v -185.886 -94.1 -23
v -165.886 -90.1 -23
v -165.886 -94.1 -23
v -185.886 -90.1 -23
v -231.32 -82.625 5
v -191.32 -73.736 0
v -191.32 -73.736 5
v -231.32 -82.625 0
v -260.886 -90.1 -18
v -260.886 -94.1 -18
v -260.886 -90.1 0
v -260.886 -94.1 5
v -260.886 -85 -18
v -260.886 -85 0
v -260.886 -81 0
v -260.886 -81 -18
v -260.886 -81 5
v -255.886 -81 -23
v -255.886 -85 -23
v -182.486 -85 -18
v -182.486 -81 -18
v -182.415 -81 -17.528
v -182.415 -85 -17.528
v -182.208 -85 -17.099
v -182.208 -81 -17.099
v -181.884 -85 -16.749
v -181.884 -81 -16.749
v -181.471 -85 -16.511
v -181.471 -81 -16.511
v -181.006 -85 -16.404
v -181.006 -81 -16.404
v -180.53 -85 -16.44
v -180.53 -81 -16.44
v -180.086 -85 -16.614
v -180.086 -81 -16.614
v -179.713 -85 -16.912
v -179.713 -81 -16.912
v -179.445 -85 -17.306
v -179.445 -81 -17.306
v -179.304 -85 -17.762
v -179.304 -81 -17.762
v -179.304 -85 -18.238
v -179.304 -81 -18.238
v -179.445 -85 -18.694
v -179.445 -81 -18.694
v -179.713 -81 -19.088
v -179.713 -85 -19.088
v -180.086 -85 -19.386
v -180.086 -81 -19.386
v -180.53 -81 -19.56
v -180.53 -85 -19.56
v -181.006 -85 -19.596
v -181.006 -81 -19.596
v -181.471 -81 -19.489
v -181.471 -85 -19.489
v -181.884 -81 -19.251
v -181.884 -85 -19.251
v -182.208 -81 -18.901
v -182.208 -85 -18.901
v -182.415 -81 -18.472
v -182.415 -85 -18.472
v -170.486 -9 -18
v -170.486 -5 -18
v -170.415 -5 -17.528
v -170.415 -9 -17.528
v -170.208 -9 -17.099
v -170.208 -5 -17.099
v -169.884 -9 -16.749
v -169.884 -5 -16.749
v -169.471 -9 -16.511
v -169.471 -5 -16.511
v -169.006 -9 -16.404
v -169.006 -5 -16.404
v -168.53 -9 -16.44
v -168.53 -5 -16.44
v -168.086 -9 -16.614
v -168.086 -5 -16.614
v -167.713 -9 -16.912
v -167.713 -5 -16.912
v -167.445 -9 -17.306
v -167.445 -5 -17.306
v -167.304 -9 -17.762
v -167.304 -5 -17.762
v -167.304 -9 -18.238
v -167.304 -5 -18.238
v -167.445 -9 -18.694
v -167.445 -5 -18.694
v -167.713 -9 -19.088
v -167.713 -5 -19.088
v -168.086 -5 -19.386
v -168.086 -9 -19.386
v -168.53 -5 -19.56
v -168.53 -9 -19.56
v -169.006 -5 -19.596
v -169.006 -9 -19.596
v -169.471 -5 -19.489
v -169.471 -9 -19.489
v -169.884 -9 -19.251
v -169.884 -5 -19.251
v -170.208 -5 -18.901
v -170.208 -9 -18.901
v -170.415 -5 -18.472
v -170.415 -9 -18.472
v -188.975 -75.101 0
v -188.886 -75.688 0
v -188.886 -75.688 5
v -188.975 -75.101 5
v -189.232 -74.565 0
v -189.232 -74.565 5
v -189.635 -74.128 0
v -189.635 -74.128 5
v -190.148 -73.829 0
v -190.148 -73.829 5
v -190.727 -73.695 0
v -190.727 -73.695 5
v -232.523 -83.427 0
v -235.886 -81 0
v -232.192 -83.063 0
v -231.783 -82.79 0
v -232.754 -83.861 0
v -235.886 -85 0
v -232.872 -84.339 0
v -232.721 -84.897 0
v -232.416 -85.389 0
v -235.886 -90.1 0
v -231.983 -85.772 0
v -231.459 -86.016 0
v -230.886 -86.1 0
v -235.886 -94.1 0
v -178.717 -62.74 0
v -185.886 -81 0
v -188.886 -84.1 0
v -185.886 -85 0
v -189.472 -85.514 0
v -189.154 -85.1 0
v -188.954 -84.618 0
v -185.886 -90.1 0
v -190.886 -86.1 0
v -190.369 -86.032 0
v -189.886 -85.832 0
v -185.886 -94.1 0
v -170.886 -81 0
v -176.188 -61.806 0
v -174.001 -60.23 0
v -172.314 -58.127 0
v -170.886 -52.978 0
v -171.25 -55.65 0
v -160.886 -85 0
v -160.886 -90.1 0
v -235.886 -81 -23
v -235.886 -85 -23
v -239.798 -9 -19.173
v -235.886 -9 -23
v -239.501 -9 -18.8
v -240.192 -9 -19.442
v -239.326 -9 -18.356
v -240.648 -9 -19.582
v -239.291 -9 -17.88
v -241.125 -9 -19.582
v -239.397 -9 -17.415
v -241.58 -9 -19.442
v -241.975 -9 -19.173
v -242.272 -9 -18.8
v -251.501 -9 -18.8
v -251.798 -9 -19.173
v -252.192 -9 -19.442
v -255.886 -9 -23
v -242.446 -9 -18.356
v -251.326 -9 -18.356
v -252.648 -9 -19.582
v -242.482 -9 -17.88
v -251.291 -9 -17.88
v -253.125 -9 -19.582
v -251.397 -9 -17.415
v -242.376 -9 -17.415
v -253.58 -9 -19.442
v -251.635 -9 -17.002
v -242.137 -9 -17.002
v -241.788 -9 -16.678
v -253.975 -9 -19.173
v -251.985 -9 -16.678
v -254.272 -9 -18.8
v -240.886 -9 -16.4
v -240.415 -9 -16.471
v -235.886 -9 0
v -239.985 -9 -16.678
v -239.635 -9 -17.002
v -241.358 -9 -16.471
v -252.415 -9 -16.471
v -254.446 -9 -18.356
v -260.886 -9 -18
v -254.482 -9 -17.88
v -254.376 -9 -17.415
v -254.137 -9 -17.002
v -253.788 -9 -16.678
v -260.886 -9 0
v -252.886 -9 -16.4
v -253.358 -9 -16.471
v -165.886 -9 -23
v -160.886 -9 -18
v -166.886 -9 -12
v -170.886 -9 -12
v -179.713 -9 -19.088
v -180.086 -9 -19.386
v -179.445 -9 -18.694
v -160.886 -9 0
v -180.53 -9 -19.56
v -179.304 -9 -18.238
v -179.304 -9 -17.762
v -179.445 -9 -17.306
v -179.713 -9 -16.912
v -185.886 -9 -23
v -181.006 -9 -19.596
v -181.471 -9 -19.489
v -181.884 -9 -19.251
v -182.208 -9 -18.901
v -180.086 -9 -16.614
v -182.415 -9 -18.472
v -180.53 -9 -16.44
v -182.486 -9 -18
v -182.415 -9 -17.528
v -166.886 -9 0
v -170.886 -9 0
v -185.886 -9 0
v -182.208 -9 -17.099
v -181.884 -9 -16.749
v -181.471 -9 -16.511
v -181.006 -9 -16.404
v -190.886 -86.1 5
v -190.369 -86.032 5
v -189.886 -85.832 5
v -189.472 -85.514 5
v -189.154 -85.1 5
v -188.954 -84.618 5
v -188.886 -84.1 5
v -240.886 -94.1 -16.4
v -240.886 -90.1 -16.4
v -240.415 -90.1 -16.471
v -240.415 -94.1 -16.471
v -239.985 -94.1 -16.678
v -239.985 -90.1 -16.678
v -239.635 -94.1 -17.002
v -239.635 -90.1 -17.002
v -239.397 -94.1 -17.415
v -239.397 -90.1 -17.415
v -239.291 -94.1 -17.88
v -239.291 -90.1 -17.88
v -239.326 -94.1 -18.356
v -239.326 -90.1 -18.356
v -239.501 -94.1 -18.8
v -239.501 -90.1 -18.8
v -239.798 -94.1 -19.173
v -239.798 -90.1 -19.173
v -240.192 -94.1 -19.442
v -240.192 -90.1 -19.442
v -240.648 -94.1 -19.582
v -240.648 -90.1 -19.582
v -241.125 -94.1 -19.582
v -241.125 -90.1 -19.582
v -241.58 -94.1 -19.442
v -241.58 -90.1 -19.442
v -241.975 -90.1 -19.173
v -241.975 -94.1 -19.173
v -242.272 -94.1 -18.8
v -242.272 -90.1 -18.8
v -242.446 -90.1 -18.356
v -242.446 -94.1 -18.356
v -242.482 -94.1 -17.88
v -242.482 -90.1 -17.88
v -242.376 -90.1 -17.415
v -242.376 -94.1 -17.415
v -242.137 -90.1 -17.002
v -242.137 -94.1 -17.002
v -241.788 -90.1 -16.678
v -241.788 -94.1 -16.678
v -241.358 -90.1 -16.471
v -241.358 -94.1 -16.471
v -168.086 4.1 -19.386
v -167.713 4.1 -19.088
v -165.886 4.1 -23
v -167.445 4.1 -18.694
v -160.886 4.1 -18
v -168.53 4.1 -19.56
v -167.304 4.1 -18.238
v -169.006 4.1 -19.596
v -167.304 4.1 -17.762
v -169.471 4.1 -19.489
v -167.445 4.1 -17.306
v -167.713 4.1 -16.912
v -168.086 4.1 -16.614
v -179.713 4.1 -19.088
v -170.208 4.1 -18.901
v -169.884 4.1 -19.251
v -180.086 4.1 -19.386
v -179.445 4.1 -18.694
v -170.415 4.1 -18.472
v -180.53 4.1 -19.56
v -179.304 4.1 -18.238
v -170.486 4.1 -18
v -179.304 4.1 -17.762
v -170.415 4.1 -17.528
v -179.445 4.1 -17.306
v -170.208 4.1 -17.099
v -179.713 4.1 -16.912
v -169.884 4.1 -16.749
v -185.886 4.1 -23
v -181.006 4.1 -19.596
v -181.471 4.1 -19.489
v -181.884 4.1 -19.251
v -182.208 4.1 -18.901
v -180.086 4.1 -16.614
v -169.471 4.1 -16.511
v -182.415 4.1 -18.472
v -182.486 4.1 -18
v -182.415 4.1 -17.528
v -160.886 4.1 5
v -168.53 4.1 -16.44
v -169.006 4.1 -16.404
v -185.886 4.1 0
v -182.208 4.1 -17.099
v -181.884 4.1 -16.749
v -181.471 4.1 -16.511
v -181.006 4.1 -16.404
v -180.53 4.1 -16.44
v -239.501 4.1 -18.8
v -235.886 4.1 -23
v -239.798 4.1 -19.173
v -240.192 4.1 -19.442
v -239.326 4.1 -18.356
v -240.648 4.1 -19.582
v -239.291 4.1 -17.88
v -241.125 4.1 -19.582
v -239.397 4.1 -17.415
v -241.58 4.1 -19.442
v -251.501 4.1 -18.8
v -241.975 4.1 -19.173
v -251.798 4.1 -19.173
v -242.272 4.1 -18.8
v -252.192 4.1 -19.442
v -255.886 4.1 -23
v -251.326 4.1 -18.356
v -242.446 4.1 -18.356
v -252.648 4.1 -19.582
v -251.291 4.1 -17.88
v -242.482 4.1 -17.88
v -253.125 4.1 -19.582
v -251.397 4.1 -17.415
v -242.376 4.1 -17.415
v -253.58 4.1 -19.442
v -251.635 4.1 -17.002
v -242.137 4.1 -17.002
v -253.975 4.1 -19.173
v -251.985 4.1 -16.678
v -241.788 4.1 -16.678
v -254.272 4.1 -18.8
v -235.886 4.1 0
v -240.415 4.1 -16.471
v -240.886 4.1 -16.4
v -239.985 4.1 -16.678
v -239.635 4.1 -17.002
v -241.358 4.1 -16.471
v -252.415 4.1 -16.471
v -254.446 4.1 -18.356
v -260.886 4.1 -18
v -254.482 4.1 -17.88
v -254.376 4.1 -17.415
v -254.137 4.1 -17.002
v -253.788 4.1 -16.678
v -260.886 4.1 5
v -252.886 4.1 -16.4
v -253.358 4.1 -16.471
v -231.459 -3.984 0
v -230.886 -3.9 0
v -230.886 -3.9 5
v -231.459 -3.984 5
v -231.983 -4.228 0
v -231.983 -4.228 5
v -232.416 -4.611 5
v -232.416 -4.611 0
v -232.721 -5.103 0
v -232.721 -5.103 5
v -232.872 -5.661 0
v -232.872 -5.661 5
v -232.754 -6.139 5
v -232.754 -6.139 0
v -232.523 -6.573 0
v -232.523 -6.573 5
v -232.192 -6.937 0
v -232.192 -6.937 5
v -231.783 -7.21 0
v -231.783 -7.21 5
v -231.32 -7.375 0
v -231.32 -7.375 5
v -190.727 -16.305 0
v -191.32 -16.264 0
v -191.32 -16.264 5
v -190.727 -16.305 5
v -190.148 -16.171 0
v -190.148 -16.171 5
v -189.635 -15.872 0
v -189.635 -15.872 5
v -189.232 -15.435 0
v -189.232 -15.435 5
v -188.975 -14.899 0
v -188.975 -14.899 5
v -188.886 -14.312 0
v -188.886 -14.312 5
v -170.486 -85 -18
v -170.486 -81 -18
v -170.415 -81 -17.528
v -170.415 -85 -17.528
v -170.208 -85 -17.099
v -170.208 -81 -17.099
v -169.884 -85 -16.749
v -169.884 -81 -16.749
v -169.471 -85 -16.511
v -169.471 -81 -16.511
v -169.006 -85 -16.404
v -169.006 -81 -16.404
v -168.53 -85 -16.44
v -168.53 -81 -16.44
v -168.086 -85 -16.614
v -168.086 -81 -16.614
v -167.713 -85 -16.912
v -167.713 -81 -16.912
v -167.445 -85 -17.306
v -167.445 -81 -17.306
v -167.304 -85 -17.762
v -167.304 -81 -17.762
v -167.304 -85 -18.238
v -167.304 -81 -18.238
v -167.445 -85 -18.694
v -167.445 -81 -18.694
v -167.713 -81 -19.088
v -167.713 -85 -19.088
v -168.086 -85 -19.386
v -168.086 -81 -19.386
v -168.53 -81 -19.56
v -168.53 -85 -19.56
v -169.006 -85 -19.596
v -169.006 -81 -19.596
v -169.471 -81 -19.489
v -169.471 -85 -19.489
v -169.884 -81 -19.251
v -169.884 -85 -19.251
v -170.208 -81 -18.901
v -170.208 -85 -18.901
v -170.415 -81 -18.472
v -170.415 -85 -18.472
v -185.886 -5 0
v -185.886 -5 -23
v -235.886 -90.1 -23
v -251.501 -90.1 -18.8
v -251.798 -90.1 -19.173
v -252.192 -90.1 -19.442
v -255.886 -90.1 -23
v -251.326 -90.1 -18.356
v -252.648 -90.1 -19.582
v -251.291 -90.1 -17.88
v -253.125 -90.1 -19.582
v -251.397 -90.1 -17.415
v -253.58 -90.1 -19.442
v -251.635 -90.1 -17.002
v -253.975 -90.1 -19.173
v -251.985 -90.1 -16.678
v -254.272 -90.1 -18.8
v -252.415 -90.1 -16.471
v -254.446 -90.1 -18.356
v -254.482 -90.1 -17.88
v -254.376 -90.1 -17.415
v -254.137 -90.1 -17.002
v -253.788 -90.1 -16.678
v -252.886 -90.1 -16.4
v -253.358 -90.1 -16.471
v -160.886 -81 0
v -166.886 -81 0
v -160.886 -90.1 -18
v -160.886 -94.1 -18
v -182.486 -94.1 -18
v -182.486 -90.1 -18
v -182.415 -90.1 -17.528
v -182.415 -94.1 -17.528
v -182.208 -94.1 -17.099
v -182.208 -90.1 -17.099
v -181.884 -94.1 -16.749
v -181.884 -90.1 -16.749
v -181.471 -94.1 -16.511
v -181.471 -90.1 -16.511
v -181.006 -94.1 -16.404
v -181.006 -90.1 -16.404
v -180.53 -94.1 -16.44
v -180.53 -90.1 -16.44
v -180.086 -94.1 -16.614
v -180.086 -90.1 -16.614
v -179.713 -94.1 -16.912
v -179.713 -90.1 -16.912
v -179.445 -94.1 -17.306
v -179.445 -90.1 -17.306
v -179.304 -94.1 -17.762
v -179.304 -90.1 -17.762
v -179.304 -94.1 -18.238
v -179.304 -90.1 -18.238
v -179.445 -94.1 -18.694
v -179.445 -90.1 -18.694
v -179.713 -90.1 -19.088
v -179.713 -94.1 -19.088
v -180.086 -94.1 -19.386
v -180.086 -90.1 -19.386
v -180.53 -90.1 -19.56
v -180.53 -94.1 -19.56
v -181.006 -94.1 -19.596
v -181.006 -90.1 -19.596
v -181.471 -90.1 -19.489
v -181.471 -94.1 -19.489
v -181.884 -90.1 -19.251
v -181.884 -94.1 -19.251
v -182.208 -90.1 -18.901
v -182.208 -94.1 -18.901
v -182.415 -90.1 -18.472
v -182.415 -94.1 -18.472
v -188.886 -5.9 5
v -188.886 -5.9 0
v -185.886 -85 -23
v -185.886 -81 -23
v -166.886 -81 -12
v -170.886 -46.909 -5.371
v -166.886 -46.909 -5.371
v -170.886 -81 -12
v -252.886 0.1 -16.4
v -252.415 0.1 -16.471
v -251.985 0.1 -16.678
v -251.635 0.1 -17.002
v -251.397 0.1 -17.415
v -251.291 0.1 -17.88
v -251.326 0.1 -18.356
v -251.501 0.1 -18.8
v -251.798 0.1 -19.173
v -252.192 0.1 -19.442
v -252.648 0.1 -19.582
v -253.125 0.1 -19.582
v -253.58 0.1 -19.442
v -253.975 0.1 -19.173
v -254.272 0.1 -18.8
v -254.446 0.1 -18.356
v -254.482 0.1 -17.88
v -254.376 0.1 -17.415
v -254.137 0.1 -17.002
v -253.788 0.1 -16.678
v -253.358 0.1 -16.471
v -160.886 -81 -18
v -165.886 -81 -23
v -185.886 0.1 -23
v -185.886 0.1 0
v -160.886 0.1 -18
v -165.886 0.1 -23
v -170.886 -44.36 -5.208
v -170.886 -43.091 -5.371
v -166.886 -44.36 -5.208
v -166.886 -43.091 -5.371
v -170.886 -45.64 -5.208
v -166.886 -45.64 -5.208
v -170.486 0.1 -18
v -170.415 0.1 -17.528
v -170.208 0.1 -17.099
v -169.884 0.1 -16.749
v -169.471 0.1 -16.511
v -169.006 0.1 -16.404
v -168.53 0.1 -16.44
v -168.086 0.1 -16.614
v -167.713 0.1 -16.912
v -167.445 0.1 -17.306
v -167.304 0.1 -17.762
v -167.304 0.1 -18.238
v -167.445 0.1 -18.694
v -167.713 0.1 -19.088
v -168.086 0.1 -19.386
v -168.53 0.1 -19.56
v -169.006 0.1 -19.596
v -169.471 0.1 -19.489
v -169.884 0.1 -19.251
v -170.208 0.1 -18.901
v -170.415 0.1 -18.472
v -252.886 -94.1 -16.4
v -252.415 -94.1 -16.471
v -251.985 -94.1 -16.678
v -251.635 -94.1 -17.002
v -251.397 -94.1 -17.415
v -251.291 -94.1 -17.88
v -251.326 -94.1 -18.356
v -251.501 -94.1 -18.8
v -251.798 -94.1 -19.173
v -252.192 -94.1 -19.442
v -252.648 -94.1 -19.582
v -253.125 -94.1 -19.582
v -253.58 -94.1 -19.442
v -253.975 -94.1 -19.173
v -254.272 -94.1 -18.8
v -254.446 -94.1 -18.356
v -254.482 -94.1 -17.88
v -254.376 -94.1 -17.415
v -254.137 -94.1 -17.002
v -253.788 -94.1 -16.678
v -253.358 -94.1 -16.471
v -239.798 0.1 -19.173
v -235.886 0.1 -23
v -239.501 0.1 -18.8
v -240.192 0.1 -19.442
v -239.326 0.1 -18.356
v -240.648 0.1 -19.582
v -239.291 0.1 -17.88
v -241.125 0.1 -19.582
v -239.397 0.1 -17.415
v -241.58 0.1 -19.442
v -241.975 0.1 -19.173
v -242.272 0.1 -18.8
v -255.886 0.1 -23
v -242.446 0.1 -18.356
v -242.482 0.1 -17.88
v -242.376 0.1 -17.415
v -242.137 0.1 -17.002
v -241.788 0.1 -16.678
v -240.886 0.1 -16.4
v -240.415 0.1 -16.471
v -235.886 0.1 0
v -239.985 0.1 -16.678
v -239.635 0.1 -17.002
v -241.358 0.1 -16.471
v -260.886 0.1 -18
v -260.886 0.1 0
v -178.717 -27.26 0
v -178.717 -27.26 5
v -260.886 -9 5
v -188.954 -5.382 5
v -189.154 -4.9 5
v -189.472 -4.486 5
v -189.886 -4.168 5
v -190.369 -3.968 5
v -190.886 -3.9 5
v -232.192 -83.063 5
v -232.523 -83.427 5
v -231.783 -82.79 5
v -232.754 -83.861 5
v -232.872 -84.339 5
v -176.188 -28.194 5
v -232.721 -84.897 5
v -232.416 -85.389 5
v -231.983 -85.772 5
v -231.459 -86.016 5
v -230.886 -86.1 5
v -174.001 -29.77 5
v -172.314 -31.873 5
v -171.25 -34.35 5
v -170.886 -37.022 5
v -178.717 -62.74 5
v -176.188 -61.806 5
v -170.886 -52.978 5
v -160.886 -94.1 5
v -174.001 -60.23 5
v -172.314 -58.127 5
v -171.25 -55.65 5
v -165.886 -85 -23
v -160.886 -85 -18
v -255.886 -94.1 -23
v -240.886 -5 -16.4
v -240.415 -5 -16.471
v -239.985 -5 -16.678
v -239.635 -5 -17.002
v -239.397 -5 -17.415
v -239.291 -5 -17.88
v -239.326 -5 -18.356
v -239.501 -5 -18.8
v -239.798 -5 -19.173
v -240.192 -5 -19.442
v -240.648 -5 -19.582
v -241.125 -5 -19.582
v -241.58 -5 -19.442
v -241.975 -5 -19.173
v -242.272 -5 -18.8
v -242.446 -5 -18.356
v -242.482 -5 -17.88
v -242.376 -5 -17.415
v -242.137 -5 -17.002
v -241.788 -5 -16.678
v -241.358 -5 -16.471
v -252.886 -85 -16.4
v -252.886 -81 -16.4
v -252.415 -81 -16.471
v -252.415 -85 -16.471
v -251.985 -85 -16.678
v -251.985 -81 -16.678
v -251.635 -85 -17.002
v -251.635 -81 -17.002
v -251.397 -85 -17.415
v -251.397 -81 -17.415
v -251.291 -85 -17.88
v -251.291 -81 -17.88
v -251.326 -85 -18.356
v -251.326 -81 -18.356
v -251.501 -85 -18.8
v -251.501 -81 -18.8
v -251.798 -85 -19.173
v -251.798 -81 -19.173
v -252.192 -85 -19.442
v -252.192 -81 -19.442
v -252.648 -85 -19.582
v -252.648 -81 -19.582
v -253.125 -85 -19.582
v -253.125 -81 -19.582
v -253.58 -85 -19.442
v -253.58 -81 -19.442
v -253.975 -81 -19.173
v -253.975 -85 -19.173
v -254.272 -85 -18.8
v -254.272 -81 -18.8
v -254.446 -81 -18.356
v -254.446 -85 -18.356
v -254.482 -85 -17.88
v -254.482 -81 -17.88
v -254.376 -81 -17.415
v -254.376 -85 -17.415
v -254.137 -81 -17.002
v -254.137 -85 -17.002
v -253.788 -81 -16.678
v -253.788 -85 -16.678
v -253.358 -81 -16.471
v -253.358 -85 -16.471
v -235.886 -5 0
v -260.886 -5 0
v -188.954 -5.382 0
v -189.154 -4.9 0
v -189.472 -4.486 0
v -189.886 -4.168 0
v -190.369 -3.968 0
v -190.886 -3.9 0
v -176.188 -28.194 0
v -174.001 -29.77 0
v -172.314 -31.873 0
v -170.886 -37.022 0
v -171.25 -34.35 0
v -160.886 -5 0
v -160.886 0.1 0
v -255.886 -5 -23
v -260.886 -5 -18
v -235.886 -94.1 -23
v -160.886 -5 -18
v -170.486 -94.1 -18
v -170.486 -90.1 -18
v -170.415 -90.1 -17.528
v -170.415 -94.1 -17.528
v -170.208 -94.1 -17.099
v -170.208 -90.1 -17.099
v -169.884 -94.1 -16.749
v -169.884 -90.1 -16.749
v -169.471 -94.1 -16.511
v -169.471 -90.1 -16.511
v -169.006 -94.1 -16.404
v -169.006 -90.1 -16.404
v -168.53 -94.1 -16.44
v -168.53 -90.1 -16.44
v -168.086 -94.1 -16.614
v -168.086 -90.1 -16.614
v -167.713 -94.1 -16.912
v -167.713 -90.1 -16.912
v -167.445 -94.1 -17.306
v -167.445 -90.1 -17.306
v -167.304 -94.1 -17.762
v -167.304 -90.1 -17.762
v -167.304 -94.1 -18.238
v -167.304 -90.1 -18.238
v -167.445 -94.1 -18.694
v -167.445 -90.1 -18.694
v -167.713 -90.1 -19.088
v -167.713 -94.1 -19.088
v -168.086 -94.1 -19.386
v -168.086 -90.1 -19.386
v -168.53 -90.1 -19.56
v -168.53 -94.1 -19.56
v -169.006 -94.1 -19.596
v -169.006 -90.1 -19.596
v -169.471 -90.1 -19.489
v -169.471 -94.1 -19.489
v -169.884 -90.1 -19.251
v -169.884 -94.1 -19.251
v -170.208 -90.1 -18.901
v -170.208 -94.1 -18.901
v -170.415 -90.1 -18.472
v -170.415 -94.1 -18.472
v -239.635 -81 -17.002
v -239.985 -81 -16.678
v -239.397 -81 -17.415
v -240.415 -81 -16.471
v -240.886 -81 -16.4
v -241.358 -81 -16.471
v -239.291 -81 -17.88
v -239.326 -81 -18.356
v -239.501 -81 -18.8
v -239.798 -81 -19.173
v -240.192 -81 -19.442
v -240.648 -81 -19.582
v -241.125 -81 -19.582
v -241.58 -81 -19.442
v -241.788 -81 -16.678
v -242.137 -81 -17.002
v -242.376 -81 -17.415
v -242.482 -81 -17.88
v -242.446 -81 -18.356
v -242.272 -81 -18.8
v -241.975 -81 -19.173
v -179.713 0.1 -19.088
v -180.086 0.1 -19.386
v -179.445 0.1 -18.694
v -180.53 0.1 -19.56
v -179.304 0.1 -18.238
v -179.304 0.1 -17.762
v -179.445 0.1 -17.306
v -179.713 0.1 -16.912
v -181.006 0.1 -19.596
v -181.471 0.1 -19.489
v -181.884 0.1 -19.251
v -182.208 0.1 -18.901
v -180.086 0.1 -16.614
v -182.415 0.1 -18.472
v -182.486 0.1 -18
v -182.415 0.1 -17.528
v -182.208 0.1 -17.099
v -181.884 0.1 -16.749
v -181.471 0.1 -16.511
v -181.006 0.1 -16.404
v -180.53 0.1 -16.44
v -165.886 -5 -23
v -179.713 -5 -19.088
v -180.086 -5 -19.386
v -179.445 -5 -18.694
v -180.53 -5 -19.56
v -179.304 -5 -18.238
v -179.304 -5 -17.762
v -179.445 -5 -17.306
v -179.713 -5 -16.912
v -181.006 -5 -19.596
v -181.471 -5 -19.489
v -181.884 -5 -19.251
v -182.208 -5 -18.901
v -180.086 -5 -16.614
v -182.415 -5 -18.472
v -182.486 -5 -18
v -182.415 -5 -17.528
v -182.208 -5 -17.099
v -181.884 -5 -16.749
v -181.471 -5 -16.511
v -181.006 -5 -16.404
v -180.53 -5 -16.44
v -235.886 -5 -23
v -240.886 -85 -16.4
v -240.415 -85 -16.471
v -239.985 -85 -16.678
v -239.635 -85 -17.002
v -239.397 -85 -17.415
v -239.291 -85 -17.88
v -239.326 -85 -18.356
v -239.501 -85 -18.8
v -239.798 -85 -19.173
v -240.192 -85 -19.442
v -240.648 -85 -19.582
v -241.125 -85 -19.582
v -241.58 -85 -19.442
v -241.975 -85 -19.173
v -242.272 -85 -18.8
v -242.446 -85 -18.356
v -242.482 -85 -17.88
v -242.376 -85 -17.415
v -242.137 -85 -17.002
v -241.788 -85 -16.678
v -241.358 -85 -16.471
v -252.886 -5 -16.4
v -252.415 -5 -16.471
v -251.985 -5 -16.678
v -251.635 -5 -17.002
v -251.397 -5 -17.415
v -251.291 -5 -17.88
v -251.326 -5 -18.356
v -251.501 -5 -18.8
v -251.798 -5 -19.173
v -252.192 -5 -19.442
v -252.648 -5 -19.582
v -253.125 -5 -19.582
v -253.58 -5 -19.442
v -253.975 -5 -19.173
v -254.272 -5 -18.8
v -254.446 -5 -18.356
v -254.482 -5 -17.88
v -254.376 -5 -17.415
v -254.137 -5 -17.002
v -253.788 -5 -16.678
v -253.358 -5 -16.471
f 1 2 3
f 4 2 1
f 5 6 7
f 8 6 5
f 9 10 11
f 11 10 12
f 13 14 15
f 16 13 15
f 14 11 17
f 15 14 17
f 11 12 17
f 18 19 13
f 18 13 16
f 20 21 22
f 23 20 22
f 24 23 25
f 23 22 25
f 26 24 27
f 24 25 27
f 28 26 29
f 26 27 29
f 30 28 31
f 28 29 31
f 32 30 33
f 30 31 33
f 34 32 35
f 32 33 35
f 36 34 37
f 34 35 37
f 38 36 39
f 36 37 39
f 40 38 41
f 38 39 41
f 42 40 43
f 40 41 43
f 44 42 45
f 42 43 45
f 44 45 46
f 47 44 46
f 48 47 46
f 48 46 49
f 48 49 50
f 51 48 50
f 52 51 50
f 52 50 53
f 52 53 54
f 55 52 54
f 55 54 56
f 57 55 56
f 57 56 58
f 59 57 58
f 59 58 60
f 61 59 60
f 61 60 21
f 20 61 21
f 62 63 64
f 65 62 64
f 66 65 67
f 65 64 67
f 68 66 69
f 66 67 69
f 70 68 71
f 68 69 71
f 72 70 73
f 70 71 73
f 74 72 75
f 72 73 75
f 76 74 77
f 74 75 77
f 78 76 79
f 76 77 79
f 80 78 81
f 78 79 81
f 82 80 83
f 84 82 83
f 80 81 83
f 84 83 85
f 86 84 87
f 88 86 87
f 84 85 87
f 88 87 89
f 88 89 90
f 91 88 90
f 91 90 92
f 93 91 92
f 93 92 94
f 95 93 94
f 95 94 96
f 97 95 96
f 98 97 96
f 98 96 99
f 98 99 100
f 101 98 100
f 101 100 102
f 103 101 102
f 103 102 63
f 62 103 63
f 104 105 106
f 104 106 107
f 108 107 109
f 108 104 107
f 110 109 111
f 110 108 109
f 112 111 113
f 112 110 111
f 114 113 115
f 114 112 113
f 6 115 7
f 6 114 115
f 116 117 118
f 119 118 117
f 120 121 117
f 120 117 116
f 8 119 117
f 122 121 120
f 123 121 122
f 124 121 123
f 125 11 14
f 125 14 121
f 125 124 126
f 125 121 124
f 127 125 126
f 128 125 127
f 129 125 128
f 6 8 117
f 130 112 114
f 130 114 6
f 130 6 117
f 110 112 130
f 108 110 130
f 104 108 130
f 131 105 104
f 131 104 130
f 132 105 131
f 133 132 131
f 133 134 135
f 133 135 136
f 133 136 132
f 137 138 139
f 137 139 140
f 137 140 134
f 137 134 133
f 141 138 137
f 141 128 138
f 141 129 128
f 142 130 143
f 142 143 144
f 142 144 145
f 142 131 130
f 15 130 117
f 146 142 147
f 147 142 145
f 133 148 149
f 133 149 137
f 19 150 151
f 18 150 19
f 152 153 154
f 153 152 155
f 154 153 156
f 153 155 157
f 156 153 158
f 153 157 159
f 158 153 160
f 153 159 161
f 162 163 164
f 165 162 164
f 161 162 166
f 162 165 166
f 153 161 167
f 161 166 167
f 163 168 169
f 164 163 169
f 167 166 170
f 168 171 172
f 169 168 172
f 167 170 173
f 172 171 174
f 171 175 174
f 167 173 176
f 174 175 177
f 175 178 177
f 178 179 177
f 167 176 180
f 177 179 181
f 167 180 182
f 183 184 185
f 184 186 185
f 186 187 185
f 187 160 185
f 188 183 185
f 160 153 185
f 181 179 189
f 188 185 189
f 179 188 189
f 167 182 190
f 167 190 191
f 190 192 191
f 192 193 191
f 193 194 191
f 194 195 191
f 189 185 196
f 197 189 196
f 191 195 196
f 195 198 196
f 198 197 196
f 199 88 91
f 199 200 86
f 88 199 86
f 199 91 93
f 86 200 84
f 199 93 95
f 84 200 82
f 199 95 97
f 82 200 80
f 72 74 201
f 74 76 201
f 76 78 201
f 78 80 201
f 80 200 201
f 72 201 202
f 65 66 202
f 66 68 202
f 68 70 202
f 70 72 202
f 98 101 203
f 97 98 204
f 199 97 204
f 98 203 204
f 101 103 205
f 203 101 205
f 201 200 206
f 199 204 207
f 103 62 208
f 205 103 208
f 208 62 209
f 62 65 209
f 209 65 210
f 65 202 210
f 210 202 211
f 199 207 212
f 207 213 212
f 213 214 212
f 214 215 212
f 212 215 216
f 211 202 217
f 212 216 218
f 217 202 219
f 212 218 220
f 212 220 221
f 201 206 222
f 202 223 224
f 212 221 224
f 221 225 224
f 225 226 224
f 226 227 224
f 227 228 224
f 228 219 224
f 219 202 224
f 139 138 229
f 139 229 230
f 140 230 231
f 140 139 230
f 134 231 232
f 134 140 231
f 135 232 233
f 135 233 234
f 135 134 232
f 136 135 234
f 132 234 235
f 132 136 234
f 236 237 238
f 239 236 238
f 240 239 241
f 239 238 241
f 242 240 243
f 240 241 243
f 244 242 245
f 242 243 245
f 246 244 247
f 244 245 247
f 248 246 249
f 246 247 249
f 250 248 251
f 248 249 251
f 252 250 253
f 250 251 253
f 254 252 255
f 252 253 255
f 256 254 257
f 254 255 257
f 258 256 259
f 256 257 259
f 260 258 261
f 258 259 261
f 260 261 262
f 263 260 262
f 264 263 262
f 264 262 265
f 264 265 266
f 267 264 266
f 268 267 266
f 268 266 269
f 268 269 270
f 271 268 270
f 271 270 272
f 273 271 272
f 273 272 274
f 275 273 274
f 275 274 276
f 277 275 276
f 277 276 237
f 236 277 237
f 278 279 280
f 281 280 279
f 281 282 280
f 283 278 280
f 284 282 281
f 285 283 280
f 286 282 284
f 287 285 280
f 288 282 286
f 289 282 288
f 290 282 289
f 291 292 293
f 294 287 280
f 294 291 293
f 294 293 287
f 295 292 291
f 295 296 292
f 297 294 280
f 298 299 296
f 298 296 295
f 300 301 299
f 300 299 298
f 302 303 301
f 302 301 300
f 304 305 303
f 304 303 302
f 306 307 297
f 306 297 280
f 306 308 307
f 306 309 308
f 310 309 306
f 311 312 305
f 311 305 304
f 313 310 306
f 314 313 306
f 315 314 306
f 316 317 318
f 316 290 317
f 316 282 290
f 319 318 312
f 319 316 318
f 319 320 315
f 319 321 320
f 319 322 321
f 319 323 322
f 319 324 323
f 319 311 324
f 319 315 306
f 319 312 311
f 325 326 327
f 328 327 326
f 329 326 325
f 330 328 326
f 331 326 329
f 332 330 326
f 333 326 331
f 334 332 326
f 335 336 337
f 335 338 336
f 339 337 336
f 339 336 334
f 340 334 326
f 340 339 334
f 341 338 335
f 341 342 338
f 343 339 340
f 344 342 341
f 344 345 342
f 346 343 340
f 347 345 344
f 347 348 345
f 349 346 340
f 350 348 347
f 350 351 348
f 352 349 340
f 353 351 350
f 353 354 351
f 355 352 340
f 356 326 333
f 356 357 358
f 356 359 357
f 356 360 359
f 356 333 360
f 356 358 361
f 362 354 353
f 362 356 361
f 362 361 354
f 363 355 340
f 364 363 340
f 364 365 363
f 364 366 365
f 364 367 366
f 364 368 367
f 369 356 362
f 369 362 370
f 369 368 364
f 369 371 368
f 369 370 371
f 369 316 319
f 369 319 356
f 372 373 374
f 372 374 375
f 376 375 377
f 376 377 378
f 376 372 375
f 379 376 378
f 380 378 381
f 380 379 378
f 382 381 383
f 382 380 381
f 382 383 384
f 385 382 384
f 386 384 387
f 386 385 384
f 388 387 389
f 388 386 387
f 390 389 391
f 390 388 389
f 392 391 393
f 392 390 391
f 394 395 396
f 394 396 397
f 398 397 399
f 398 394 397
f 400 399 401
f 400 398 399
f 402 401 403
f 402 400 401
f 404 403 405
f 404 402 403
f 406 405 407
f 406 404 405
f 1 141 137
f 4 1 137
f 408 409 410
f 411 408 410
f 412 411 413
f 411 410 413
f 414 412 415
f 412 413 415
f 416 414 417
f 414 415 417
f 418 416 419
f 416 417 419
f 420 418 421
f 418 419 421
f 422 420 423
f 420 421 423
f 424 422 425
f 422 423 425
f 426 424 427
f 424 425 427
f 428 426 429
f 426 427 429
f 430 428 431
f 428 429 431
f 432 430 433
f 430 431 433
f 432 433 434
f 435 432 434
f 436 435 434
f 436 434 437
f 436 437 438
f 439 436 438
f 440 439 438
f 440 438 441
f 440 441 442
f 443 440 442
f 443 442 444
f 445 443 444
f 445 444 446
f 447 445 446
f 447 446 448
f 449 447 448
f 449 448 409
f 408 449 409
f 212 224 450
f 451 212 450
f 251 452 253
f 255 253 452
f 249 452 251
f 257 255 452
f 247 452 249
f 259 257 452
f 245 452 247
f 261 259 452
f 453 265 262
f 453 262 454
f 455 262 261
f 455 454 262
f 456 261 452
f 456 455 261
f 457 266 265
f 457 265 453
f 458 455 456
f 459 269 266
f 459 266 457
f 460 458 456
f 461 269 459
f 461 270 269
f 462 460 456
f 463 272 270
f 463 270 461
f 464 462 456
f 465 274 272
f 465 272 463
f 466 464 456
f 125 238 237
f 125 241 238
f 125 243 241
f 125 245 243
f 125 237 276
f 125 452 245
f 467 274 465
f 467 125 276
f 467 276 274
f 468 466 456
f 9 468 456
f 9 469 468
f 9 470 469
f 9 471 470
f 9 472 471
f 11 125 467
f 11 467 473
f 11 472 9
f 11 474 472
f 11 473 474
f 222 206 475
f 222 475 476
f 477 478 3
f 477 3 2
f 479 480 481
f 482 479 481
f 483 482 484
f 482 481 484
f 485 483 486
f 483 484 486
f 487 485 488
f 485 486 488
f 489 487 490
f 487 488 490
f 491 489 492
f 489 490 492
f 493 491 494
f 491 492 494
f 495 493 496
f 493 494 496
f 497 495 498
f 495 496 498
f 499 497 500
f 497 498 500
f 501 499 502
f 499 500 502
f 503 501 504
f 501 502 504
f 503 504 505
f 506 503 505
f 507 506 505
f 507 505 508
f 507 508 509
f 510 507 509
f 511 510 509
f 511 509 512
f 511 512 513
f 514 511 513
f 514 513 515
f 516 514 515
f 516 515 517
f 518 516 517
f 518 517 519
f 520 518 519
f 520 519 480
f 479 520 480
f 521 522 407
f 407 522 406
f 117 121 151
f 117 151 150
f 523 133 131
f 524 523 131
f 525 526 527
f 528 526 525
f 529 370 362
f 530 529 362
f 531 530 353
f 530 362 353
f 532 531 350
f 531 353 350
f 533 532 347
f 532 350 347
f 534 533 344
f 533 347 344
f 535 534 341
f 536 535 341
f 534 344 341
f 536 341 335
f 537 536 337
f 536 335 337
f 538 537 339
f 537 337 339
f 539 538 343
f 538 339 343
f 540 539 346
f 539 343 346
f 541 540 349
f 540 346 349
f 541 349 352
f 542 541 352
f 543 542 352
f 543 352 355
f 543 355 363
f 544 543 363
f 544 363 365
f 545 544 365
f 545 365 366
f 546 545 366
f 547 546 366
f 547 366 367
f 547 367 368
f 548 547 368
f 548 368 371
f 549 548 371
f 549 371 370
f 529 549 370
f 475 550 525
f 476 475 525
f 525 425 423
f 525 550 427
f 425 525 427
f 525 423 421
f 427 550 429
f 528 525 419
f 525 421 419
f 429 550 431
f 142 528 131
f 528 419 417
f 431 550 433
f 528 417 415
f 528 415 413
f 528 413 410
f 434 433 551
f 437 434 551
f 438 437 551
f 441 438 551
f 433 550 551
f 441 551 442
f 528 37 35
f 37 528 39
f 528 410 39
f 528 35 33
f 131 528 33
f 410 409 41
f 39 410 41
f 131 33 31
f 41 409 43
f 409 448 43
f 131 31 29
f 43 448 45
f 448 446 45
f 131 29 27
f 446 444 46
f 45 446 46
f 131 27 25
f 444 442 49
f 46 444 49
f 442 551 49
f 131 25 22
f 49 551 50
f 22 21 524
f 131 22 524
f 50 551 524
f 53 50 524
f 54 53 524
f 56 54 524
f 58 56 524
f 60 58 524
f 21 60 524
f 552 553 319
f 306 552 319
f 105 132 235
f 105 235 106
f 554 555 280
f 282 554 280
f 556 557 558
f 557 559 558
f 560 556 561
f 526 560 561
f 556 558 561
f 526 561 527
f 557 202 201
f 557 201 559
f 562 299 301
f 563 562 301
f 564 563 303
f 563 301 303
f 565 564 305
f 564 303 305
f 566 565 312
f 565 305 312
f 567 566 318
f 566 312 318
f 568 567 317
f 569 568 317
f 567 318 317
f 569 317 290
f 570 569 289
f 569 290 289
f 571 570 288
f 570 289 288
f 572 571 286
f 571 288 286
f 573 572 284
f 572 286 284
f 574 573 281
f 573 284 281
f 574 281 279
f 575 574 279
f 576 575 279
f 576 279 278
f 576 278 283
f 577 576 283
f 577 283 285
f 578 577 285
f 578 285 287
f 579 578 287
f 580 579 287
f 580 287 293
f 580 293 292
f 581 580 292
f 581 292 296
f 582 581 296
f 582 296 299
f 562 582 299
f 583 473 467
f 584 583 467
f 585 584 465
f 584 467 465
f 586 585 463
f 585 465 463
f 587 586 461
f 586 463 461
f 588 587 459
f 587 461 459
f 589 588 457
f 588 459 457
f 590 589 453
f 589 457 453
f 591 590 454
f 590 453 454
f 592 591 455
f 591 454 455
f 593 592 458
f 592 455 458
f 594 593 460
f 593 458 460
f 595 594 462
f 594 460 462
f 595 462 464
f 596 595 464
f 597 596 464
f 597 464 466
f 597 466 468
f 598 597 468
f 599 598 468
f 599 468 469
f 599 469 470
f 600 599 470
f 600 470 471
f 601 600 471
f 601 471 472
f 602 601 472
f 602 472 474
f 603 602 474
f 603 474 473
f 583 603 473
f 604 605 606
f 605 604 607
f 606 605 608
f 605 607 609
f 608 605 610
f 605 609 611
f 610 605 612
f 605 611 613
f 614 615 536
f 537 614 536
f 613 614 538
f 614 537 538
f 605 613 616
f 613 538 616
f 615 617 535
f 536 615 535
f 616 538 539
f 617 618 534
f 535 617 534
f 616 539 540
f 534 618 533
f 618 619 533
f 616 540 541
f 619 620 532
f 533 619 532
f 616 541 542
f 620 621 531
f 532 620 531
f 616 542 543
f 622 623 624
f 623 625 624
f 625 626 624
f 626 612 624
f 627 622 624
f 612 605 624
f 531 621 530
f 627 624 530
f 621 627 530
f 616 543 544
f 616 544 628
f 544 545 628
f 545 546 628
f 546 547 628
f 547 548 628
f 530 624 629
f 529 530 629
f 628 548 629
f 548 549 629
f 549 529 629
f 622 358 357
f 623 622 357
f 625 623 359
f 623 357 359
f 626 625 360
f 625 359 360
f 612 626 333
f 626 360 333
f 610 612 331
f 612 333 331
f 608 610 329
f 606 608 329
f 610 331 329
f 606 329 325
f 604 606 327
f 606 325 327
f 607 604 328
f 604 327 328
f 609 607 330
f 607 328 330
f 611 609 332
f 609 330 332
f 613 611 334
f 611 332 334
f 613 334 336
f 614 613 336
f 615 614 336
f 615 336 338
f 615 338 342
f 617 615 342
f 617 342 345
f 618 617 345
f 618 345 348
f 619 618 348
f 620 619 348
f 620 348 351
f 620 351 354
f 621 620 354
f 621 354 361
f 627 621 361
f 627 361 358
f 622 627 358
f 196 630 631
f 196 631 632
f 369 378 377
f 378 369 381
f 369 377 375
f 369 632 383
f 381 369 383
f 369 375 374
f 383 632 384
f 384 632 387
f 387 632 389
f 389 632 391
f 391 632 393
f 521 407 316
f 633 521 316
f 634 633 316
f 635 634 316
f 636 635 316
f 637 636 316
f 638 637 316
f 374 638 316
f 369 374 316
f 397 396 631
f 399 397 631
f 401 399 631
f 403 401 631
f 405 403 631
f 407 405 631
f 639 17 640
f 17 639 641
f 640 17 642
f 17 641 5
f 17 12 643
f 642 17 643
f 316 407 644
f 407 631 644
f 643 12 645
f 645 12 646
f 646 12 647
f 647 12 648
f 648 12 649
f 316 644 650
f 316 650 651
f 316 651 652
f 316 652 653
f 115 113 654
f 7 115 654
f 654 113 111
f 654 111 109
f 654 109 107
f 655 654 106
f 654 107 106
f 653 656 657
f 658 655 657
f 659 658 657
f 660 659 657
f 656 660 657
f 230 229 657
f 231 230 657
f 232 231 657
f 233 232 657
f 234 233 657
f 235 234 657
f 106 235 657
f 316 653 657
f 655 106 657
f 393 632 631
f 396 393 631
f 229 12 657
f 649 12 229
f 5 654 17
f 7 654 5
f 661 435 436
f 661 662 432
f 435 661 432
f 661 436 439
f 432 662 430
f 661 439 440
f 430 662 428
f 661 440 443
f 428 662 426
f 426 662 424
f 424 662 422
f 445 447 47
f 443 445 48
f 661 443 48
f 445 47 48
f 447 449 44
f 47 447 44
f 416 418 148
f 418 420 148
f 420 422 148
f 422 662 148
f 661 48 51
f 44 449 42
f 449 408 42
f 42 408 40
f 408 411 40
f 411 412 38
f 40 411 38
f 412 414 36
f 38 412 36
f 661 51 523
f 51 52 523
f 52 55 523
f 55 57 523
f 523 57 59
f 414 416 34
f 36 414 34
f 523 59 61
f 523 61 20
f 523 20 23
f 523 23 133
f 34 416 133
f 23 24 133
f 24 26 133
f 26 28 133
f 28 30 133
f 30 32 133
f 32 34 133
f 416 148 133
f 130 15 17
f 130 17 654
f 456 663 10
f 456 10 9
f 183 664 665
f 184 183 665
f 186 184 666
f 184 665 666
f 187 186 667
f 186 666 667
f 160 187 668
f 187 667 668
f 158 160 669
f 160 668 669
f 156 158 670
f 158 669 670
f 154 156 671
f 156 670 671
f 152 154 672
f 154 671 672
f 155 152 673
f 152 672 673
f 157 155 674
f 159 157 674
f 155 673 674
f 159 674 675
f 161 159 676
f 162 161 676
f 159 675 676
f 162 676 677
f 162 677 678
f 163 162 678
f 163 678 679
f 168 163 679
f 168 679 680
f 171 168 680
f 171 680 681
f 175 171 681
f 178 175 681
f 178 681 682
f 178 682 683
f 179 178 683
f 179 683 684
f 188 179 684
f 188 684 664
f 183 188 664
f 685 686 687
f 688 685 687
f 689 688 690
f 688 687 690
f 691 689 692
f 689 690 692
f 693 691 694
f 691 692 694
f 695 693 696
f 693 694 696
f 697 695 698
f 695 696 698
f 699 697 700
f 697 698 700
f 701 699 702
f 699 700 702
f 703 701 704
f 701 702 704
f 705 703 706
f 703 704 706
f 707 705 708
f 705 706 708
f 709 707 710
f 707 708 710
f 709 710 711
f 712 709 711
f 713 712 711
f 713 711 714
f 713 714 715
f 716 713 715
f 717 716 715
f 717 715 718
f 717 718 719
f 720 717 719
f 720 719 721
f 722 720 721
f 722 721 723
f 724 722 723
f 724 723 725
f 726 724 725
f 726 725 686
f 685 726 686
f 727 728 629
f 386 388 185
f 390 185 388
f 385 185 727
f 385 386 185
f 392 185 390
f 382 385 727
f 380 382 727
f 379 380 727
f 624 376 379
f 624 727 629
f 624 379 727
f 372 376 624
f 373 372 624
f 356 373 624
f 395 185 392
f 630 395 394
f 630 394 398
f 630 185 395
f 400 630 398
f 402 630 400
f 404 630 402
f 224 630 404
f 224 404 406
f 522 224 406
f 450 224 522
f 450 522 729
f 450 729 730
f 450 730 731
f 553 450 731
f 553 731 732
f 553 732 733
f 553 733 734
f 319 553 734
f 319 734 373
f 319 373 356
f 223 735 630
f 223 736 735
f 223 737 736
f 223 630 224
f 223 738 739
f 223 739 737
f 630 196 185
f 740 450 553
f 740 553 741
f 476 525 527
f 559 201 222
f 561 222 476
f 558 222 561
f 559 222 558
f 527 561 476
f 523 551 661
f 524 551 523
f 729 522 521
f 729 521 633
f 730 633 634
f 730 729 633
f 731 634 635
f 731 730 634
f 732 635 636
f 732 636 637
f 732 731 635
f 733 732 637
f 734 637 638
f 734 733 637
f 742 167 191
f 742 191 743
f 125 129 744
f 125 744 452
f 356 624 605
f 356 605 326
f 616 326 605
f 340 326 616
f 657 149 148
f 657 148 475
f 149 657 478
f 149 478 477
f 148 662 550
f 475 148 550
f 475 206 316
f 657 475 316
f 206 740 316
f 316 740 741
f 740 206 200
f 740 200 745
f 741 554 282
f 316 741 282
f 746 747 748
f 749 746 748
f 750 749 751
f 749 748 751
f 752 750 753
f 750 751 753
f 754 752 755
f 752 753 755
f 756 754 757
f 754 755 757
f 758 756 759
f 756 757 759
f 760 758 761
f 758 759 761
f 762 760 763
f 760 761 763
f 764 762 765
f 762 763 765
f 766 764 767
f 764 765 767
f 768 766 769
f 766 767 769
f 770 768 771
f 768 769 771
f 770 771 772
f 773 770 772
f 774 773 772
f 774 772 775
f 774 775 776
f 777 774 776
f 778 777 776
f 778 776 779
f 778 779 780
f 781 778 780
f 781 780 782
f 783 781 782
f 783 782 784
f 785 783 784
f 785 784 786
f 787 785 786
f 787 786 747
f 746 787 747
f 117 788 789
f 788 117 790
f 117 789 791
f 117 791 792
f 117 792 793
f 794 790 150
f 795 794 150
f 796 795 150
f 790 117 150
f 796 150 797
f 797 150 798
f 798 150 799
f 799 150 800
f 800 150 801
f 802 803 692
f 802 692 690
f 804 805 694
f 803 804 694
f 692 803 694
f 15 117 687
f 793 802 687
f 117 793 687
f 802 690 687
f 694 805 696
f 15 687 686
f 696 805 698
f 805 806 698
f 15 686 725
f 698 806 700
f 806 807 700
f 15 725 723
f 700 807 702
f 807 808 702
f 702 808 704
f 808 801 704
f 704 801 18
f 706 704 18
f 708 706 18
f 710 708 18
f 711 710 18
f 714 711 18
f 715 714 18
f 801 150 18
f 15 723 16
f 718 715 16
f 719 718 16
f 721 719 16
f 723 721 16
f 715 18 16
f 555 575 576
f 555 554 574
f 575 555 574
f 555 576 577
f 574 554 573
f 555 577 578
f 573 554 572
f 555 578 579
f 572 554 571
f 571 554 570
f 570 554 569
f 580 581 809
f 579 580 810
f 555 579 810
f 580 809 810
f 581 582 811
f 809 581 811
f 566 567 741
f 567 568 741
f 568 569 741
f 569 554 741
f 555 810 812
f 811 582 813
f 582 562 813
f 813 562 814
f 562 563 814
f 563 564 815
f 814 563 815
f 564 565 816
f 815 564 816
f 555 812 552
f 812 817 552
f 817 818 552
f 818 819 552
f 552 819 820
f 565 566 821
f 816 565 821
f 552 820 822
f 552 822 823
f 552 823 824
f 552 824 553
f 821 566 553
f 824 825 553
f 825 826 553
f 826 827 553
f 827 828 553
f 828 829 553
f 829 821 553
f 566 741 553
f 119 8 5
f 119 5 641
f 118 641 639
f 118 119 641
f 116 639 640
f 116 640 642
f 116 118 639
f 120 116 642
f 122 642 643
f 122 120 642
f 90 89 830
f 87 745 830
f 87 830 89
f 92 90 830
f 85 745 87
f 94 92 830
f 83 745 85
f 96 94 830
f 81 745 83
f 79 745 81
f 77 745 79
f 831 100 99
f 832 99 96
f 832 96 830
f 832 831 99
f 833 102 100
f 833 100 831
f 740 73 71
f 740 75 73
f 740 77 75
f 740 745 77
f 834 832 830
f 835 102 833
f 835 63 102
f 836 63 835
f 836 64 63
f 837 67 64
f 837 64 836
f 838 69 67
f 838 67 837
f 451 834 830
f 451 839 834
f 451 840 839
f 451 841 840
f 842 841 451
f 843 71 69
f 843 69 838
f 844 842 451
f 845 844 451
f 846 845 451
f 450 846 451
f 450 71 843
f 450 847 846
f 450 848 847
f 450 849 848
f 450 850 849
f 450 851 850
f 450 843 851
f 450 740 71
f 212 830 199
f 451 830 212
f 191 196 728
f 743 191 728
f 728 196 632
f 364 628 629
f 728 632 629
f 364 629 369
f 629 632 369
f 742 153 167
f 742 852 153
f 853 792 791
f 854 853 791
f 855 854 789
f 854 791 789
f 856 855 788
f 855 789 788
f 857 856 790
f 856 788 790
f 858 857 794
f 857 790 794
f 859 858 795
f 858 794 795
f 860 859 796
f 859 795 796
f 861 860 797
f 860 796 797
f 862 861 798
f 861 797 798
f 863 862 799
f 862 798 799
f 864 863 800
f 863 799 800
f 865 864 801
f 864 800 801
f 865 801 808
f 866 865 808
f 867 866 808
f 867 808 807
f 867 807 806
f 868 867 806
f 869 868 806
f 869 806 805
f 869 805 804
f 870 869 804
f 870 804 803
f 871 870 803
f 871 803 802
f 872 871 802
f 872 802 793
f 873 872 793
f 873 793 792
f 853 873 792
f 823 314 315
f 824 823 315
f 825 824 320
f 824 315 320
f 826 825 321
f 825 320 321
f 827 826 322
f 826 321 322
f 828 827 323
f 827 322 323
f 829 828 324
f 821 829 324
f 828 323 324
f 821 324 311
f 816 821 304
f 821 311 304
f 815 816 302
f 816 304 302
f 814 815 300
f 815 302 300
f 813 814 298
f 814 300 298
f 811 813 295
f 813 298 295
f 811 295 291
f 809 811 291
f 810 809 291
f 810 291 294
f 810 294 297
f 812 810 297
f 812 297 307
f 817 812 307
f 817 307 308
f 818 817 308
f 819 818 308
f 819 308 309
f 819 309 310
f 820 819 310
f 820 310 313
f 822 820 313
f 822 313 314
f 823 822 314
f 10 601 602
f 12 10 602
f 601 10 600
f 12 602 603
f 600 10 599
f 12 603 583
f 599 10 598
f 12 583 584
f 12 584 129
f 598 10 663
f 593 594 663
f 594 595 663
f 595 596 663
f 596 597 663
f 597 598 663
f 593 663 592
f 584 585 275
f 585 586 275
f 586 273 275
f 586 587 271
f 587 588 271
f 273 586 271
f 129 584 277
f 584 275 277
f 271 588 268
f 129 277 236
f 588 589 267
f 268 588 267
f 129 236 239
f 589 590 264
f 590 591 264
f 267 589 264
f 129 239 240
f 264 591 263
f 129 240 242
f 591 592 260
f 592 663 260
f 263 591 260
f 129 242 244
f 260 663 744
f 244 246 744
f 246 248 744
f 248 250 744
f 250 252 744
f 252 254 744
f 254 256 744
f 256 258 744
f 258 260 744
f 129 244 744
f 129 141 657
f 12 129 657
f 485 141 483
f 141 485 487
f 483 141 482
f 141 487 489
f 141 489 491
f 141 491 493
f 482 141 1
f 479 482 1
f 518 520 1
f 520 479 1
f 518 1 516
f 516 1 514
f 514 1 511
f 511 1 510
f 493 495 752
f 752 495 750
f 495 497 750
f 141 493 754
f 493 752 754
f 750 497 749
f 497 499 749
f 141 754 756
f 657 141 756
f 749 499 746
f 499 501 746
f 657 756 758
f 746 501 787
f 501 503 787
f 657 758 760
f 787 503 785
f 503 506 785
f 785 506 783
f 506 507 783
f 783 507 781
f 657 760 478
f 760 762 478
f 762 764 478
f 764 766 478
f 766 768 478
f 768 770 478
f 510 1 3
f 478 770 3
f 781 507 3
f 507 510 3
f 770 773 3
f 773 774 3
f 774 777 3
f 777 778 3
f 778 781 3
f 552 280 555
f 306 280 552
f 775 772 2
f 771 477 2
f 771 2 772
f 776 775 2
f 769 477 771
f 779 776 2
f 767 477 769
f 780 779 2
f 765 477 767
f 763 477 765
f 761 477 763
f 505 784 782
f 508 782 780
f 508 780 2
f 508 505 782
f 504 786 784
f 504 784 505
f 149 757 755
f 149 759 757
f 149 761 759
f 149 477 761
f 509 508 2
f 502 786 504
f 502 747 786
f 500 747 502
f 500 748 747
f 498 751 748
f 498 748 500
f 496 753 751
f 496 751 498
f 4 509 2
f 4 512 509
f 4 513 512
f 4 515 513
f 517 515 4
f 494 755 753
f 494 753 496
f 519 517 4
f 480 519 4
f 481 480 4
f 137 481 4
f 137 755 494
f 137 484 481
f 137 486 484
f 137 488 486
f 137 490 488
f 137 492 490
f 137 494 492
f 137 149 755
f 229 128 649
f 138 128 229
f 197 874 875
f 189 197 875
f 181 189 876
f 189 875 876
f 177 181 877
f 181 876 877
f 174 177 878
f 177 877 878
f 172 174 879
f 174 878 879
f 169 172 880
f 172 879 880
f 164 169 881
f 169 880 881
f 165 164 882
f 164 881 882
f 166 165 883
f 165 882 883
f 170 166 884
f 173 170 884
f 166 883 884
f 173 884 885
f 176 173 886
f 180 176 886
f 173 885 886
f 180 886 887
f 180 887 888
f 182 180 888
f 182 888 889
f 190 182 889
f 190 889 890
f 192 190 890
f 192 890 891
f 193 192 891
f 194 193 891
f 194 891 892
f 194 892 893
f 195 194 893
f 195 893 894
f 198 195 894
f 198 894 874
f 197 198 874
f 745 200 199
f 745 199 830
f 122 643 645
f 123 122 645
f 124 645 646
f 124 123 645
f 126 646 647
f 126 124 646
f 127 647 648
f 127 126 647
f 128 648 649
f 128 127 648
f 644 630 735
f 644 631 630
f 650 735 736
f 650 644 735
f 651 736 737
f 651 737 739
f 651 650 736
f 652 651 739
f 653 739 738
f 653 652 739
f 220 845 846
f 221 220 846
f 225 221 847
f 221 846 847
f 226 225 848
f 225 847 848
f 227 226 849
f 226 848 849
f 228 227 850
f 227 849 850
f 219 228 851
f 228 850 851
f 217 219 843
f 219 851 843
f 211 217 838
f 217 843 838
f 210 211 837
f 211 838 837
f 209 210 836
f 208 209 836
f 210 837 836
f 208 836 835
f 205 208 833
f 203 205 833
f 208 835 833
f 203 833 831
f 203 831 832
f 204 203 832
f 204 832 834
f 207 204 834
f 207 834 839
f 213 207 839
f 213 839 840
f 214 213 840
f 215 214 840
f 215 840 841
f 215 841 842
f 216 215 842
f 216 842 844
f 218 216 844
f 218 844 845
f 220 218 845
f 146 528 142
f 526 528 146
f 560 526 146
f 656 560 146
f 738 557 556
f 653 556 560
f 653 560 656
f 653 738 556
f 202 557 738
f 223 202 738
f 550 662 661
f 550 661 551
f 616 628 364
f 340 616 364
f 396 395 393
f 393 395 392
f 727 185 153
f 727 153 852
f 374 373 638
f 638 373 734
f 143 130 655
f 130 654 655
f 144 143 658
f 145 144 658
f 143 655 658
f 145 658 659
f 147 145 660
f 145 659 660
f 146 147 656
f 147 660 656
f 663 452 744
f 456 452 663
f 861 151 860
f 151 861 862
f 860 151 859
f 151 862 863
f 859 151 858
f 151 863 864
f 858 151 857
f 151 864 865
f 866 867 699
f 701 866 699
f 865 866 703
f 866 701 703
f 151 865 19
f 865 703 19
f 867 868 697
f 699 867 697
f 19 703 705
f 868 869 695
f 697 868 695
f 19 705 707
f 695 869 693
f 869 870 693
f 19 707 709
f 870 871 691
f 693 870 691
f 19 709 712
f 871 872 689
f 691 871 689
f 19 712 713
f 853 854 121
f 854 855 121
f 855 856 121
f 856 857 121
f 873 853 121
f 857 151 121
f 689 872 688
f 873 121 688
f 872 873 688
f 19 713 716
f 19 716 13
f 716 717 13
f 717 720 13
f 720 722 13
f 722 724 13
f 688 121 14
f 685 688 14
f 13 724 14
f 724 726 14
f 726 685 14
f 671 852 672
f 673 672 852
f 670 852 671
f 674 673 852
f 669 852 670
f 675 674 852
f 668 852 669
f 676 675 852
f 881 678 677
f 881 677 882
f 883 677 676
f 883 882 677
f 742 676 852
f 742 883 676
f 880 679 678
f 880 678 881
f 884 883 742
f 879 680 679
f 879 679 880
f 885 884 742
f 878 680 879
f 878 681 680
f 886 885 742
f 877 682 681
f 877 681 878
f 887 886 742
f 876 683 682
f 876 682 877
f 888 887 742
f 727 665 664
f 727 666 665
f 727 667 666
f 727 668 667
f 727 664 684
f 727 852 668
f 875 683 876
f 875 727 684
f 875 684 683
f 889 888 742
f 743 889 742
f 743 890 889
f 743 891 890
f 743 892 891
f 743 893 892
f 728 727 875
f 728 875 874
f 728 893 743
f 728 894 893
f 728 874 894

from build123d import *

# Parameters (mm, degrees)
SKETCH_1_W          = 100
SKETCH_1_H          = 98.2
EXTRUDE_1_DEPTH     = 5
SKETCH_2_W          = 25
SKETCH_2_H          = 4
EXTRUDE_2_DEPTH     = 23
CHAMFER_1_SIZE      = 5
SKETCH_3_R          = 1.6
CUT_EXTRUDE_1_DEPTH = 100
SKETCH_5_W          = 90
SKETCH_5_H          = 72
CUT_EXTRUDE_2_DEPTH = 10
EXTRUDE_3_DEPTH     = 5
FILLET_1_R          = 10
EXTRUDE_4_DEPTH     = 4
CUT_EXTRUDE_3_DEPTH = 10
FILLET1_R           = 10
FILLET2_R           = 2


with BuildPart() as part:
    # 草图1 → 凸台-拉伸1 (new body)
    with BuildSketch(Plane.XY):
        with Locations((-210.886237356, -45)):
            Rectangle(SKETCH_1_W, SKETCH_1_H)
        with BuildLine():
            ThreePointArc((-245.131057565, -22.358440495), (-248.492232664, -20.607289414), (-250.886237356, -23.545446947))
            Line((-250.886237356, -23.545446947), (-250.886237356, -78))
            ThreePointArc((-250.886237356, -78), (-250.0075577, -80.121320344), (-247.886237356, -81))
            Line((-247.886237356, -81), (-224.42573361, -81))
            ThreePointArc((-224.42573361, -81), (-221.919639103, -79.649087724), (-221.670553819, -76.812993548))
            Line((-221.670553819, -76.812993548), (-245.131057565, -22.358440495))
        make_face(mode=Mode.SUBTRACT)
        with BuildLine():
            ThreePointArc((-191.655684006, -33.128922342), (-194.657829236, -31.333405344), (-197.320051564, -33.602618764))
            Line((-197.320051564, -33.602618764), (-208.123721184, -77.279649032))
            ThreePointArc((-208.123721184, -77.279649032), (-207.573803103, -79.849181859), (-205.211489311, -81))
            Line((-205.211489311, -81), (-175.458011282, -81))
            ThreePointArc((-175.458011282, -81), (-172.949810516, -79.645882413), (-172.705875596, -76.805952611))
            Line((-172.705875596, -76.805952611), (-191.655684006, -33.128922342))
        make_face(mode=Mode.SUBTRACT)
        with BuildLine():
            ThreePointArc((-176.638373042, -42.617387799), (-173.276486201, -44.360720795), (-170.886237356, -41.42334041))
            Line((-170.886237356, -41.42334041), (-170.886237356, -12))
            ThreePointArc((-170.886237356, -12), (-171.764917013, -9.878679656), (-173.886237356, -9))
            Line((-173.886237356, -9), (-186.651909841, -9))
            ThreePointArc((-186.651909841, -9), (-189.160110607, -10.354117587), (-189.404045527, -13.194047389))
            Line((-189.404045527, -13.194047389), (-176.638373042, -42.617387799))
        make_face(mode=Mode.SUBTRACT)
        with BuildLine():
            Line((-203.040454286, -12.717792993), (-213.768880163, -56.2546336))
            ThreePointArc((-213.768880163, -56.2546336), (-216.43424337, -58.526613784), (-219.43692336, -56.723847059))
            Line((-219.43692336, -56.723847059), (-238.193779397, -13.187006452))
            ThreePointArc((-238.193779397, -13.187006452), (-237.944694112, -10.350912276), (-235.438599605, -9))
            Line((-235.438599605, -9), (-205.953317692, -9))
            ThreePointArc((-205.953317692, -9), (-203.591816159, -10.149780956), (-203.040454286, -12.717792993))
        make_face(mode=Mode.SUBTRACT)
    extrude(amount=EXTRUDE_1_DEPTH)

    # 草图2 → 凸台-拉伸2 (add)
    with BuildSketch(Plane(origin=(0, 0, 0), x_dir=(-1, 0, 0), z_dir=(0, 0, -1))):
        with Locations((248.386237356, 2.1)):
            Rectangle(SKETCH_2_W, SKETCH_2_H)
        with Locations((248.386237356, -7)):
            Rectangle(SKETCH_2_W, SKETCH_2_H)
        with Locations((173.386237356, -7)):
            Rectangle(SKETCH_2_W, SKETCH_2_H)
        with Locations((173.386237356, 2.1)):
            Rectangle(SKETCH_2_W, SKETCH_2_H)
        with Locations((173.386237356, -92.1)):
            Rectangle(SKETCH_2_W, SKETCH_2_H)
        with Locations((173.386237356, -83)):
            Rectangle(SKETCH_2_W, SKETCH_2_H)
        with Locations((248.386237356, -83)):
            Rectangle(SKETCH_2_W, SKETCH_2_H)
        with Locations((248.386237356, -92.1)):
            Rectangle(SKETCH_2_W, SKETCH_2_H)
    extrude(amount=EXTRUDE_2_DEPTH)

    # 倒角1
    chamfer_1_edges = [part.edges().sort_by_distance(p)[0] for p in [
        (-160.886237356, -7, -23),
        (-160.886237356, 2.1, -23),
        (-160.886237356, -92.1, -23),
        (-160.886237356, -83, -23),
        (-260.886237356, -83, -23),
        (-260.886237356, -92.1, -23),
        (-260.886237356, 2.1, -23),
        (-260.886237356, -7, -23),
    ]]
    chamfer(chamfer_1_edges, length=CHAMFER_1_SIZE)

    # 草图3 → 切除-拉伸1 (cut)
    with BuildSketch(Plane(origin=(0, 4.1, 0), x_dir=(1, 0, 0), z_dir=(0, 1, 0))):
        with Locations(Location((-252.886237356, 18, 0), (0, 0, 270))):
            Circle(SKETCH_3_R)
        with Locations(Location((-240.886237356, 18, 0), (0, 0, 270))):
            Circle(SKETCH_3_R)
        with Locations(Location((-180.886237356, 18, 0), (0, 0, 180))):
            Circle(SKETCH_3_R)
        with Locations(Location((-168.886237356, 18, 0), (0, 0, 180))):
            Circle(SKETCH_3_R)
    extrude(amount=-CUT_EXTRUDE_1_DEPTH, mode=Mode.SUBTRACT)

    # 草图5 → 切除-拉伸2 (cut)
    with BuildSketch(Plane(origin=(0, 0, 0), x_dir=(-1, 0, 0), z_dir=(0, 0, -1))):
        with Locations((215.886237356, -45)):
            Rectangle(SKETCH_5_W, SKETCH_5_H)
    extrude(amount=-CUT_EXTRUDE_2_DEPTH, mode=Mode.SUBTRACT)

    # 草图6 → 凸台-拉伸3 (add)
    with BuildSketch(Plane(origin=(0, 0, 0), x_dir=(-1, 0, 0), z_dir=(0, 0, -1))):
        Polygon((170.886237356, -29), (260.886237356, -9), (170.886237356, -9), align=None)
        Polygon((170.886237356, -61), (170.886237356, -81), (260.886237356, -81), align=None)
    extrude(amount=-EXTRUDE_3_DEPTH)

    # 圆角1
    fillet_1_edges = [part.edges().sort_by_distance(p)[0] for p in [
        (-170.886237356, -29, 2.5),
        (-170.886237356, -61, 2.5),
    ]]
    fillet(fillet_1_edges, radius=FILLET_1_R)

    # 草图7 → 凸台-拉伸4 (add)
    with BuildSketch(Plane(origin=(-170.886237356, 0, 0), x_dir=(0, 0, -1), z_dir=(1, 0, 0))):
        Polygon((12, -9), (5, -45), (12, -81), (0, -81), (0, -9), align=None)
    extrude(amount=EXTRUDE_4_DEPTH)

    # 草图8 → 切除-拉伸3 (cut)
    with BuildSketch(Plane(origin=(0, 0, 0), x_dir=(-1, 0, 0), z_dir=(0, 0, -1))):
        Polygon((188.886237356, -16.804849371), (232.886237356, -7.027071594), (232.886237356, -3.9), (188.886237356, -3.9), align=None)
        Polygon((188.886237356, -86.1), (188.886237356, -73.195150629), (232.886237356, -82.972928406), (232.886237356, -86.1), align=None)
    extrude(amount=-CUT_EXTRUDE_3_DEPTH, mode=Mode.SUBTRACT)

    # Fillet1
    fillet1_edges = [part.edges().sort_by_distance(p)[0] for p in [
        (-168.886237356, -45, -5),
    ]]
    fillet(fillet1_edges, radius=FILLET1_R)

    # Fillet2
    # the kernel refuses this fillet: 2 mm, written as the material it adds along each edge
    with BuildSketch(Plane(origin=(-188.886237356, -16.804849371, 0), x_dir=(-0.9761870601839525, 0.2169304578186577, 0), z_dir=(0, 0, 1))) as fillet2_piece_1:
        with BuildLine():
            CenterArc((FILLET2_R * 1.24661605081, -FILLET2_R), FILLET2_R, 90, 102.528807709)
            Line((FILLET2_R * 0.270428990626, -FILLET2_R * 1.21693045782), (0, 0))
            Line((0, 0), (FILLET2_R * 1.24661605081, 0))
        make_face()
    extrude(amount=5)
    with BuildSketch(Plane(origin=(-232.886237356, -7.027071594, 0), x_dir=(0.9761870601839526, -0.21693045781865725, 0), z_dir=(0, 0, 1)), Plane(origin=(-232.886237356, -82.972928406, 0), x_dir=(0, -1, 0), z_dir=(0, 0, 1))) as fillet2_piece_2:
        with BuildLine():
            CenterArc((FILLET2_R * 0.802171606366, FILLET2_R), FILLET2_R, 192.528807709, 77.471192291)
            Line((-FILLET2_R * 0.174015453818, FILLET2_R * 0.783069542181), (0, 0))
            Line((0, 0), (FILLET2_R * 0.802171606366, 0))
        make_face()
    extrude(amount=5)
    with BuildSketch(Plane(origin=(-232.886237356, -3.9, 0), x_dir=(0, -1, 0), z_dir=(0, 0, 1)), Plane(origin=(-188.886237356, -3.9, 0), x_dir=(-1, 0, 0), z_dir=(0, 0, 1)), Plane(origin=(-232.886237356, -86.1, 0), x_dir=(1, 0, 0), z_dir=(0, 0, 1))) as fillet2_piece_3:
        with BuildLine():
            CenterArc((FILLET2_R, FILLET2_R), FILLET2_R, 180, 90)
            Line((0, FILLET2_R), (0, 0))
            Line((0, 0), (FILLET2_R, 0))
        make_face()
    extrude(amount=5)
    with BuildSketch(Plane(origin=(-188.886237356, -73.195150629, 0), x_dir=(-0.9761870601839525, -0.21693045781865739, 0), z_dir=(0, 0, 1))) as fillet2_piece_4:
        with BuildLine():
            CenterArc((FILLET2_R * 1.24661605081, FILLET2_R), FILLET2_R, 167.471192291, 102.528807709)
            Line((FILLET2_R * 0.270428990626, FILLET2_R * 1.21693045782), (0, 0))
            Line((0, 0), (FILLET2_R * 1.24661605081, 0))
        make_face()
    extrude(amount=5)
    with BuildSketch(Plane(origin=(-188.886237356, -86.1, 0), x_dir=(-1, 0, 0), z_dir=(0, 0, 1))) as fillet2_piece_5:
        with BuildLine():
            CenterArc((FILLET2_R, -FILLET2_R), FILLET2_R, 90, 90)
            Line((0, -FILLET2_R), (0, 0))
            Line((0, 0), (FILLET2_R, 0))
        make_face()
    extrude(amount=5)


solid = part.part
